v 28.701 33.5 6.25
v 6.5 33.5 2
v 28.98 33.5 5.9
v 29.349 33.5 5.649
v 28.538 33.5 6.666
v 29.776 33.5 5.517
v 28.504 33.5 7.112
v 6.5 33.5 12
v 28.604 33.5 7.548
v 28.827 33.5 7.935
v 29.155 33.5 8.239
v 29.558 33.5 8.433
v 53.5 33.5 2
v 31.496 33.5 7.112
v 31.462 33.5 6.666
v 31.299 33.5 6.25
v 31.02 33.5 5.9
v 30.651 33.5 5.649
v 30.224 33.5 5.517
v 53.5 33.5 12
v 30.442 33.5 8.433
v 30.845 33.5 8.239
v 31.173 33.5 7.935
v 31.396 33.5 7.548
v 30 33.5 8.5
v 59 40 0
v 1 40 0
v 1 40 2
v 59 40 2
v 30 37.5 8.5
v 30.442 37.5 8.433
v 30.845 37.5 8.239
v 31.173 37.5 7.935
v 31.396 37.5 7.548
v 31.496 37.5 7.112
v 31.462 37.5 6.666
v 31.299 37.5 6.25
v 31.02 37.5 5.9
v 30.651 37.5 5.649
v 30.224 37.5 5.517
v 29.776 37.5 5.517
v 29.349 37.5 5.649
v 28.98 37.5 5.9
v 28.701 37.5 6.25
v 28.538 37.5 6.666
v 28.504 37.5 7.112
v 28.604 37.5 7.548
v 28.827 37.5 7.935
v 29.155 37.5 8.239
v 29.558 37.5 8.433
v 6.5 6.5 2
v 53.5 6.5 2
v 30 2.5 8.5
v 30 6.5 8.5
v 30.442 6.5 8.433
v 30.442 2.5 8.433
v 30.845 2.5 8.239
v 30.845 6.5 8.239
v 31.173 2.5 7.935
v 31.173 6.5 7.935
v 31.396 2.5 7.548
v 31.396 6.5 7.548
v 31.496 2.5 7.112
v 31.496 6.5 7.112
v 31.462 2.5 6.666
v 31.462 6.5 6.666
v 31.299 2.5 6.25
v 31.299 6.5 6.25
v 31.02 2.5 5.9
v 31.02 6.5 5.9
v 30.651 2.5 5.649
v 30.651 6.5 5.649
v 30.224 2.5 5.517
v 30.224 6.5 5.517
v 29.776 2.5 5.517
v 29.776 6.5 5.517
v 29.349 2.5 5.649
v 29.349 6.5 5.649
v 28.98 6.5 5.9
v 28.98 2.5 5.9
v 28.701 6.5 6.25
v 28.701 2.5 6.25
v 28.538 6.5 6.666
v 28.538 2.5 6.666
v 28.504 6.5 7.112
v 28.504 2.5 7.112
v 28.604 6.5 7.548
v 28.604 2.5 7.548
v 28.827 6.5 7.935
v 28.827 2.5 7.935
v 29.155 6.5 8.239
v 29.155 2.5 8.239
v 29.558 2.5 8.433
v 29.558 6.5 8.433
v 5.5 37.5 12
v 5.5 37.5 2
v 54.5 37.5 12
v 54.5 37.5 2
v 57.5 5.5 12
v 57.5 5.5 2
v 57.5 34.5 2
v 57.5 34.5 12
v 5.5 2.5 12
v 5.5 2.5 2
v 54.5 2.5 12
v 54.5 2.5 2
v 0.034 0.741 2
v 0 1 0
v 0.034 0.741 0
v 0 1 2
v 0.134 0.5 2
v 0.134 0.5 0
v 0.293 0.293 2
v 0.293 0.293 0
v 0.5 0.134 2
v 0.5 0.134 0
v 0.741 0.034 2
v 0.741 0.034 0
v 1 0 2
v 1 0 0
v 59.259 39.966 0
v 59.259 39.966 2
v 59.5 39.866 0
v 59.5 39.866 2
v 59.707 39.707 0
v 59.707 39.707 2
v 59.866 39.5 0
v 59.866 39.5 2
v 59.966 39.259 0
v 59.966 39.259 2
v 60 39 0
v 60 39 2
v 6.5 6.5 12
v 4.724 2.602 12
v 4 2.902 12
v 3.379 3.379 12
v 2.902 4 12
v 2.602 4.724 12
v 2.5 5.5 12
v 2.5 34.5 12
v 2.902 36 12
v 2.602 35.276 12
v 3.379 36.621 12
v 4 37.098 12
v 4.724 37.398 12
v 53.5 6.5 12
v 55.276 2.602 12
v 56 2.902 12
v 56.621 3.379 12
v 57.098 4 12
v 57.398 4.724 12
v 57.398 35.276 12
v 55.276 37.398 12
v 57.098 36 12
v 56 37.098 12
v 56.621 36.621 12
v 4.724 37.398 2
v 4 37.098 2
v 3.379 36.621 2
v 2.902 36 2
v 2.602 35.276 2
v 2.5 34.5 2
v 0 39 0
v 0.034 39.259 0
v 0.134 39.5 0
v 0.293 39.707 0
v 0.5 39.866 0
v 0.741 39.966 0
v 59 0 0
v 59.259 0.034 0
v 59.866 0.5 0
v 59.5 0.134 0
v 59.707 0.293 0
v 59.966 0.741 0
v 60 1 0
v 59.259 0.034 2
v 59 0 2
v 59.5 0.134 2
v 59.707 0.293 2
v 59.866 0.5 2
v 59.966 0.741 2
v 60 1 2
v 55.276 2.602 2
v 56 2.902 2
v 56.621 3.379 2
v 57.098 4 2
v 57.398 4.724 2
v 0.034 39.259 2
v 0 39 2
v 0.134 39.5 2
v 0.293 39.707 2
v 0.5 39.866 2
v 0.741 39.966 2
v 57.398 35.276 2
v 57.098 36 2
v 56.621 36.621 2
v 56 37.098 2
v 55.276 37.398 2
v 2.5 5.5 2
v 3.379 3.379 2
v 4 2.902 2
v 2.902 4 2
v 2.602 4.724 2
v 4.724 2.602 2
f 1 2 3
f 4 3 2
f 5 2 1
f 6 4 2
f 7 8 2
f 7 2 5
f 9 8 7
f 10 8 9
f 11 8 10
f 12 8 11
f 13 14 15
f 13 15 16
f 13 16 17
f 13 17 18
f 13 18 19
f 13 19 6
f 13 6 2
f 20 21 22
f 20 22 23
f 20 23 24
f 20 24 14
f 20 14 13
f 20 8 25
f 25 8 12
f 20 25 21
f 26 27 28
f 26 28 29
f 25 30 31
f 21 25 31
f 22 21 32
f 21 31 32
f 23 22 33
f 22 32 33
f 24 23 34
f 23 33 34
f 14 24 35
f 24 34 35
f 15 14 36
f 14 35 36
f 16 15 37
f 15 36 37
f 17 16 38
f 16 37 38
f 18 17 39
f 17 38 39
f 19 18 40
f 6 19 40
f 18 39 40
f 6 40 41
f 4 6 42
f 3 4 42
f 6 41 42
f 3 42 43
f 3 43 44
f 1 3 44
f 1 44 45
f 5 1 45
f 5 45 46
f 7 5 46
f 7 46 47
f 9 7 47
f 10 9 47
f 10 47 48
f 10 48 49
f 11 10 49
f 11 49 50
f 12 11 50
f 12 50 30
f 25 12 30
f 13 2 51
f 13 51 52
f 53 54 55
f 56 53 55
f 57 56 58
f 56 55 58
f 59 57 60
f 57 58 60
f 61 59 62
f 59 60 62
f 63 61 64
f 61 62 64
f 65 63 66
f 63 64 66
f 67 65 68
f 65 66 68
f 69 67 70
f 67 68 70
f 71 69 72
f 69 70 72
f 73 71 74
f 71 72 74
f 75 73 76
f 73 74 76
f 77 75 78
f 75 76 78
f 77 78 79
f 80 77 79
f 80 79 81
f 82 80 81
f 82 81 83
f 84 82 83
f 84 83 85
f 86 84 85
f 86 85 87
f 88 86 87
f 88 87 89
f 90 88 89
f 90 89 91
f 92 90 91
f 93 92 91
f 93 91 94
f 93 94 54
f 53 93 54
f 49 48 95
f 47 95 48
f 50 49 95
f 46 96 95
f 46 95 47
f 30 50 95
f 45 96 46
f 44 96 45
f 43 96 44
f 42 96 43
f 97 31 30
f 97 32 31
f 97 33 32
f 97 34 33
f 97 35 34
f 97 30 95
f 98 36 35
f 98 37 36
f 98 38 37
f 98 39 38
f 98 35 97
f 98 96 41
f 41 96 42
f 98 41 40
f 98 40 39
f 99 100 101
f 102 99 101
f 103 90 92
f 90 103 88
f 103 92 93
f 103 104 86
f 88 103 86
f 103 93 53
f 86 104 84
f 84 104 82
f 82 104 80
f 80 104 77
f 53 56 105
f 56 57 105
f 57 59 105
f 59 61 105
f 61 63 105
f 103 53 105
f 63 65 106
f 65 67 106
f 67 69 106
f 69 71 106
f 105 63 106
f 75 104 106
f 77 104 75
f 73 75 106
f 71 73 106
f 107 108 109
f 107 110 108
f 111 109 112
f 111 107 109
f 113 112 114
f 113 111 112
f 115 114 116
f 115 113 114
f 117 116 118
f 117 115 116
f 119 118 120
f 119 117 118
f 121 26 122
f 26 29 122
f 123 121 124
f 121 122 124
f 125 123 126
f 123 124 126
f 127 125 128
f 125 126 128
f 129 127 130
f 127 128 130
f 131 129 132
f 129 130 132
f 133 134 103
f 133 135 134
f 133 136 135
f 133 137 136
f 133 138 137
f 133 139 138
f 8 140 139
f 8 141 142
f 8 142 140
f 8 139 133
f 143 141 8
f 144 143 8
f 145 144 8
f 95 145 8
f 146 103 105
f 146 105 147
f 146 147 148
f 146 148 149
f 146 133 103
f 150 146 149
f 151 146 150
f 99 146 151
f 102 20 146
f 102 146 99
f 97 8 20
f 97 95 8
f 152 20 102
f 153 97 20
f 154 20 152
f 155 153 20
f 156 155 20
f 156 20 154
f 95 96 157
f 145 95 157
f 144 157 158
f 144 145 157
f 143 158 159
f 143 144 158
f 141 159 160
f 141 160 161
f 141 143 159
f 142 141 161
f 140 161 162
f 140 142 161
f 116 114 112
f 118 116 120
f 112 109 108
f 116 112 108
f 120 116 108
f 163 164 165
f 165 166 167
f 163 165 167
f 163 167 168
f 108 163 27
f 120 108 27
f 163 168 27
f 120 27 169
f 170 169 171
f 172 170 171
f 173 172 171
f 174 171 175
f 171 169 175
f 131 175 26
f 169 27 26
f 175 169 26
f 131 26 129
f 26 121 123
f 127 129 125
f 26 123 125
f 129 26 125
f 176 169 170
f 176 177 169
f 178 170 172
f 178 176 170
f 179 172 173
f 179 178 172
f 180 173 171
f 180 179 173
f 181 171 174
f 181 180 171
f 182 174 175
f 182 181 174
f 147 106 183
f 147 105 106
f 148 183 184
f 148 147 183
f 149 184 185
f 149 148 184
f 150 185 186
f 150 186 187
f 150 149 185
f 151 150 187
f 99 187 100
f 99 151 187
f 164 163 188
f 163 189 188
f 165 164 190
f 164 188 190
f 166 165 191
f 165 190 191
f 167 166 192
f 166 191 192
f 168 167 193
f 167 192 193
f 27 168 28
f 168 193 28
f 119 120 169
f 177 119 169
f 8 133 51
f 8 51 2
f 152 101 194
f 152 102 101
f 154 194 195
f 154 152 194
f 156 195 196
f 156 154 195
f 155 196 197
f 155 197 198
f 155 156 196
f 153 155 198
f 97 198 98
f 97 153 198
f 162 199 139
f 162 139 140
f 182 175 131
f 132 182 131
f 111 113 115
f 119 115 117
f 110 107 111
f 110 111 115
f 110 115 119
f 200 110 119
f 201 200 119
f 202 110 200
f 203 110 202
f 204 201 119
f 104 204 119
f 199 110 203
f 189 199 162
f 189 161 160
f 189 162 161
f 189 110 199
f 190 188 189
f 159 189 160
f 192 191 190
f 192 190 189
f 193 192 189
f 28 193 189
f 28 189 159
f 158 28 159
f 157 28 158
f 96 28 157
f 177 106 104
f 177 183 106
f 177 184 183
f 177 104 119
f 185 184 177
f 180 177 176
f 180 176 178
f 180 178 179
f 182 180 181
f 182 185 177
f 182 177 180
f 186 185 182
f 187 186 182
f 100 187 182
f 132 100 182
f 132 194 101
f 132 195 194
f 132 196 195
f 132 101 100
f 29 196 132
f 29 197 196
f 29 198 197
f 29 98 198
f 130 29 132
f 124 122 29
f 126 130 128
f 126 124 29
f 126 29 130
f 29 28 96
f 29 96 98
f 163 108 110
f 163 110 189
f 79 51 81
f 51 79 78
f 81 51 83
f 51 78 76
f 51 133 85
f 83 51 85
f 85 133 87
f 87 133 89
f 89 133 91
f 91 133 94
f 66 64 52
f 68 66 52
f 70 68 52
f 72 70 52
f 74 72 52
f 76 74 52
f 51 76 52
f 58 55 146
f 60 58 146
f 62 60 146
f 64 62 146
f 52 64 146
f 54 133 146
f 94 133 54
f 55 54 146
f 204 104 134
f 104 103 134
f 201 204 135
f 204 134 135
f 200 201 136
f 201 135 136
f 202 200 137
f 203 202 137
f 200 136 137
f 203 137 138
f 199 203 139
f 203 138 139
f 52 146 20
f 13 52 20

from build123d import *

# Parameters (mm, degrees)
ESQUISSE1_W             = 60
ESQUISSE1_H             = 40
BOSS_EXTRU_1_DEPTH      = 2
ESQUISSE2_W             = 55
ESQUISSE2_H             = 35
BOSS_EXTRU_2_DEPTH      = 10
CONG_1_R                = 3
CONG_2_R                = 1
ESQUISSE3_W             = 47
ESQUISSE3_H             = 27
ENL_V_MAT_EXTRU_1_DEPTH = 10
ESQUISSE4_R             = 1.5
ENL_V_MAT_EXTRU_2_DEPTH = 72.765242283


with BuildPart() as part:
    # Esquisse1 → Boss.-Extru.1 (new body)
    with BuildSketch(Plane.XY):
        with Locations((30, 20)):
            Rectangle(ESQUISSE1_W, ESQUISSE1_H)
    extrude(amount=BOSS_EXTRU_1_DEPTH)

    # Esquisse2 → Boss.-Extru.2 (add)
    with BuildSketch(Plane.XY.offset(2)):
        with Locations((30, 20)):
            Rectangle(ESQUISSE2_W, ESQUISSE2_H)
    extrude(amount=BOSS_EXTRU_2_DEPTH)

    # Congé1
    cong_1_edges = [part.edges().sort_by_distance(p)[0] for p in [
        (57.5, 37.5, 7),
        (2.5, 37.5, 7),
        (2.5, 2.5, 7),
        (57.5, 2.5, 7),
    ]]
    fillet(cong_1_edges, radius=CONG_1_R)

    # Congé2
    cong_2_edges = [part.edges().sort_by_distance(p)[0] for p in [
        (0, 40, 1),
        (60, 40, 1),
        (60, 0, 1),
        (0, 0, 1),
    ]]
    fillet(cong_2_edges, radius=CONG_2_R)

    # Esquisse3 → Enlèv. mat.-Extru.1 (cut)
    with BuildSketch(Plane.XY.offset(12)):
        with Locations((30, 20)):
            Rectangle(ESQUISSE3_W, ESQUISSE3_H)
    extrude(amount=-ENL_V_MAT_EXTRU_1_DEPTH, mode=Mode.SUBTRACT)

    # Esquisse4 → Enlèv. mat.-Extru.2 (cut, through all)
    with BuildSketch(Plane(origin=(0, 37.5, 0), x_dir=(1, 0, 0), z_dir=(0, 1, 0))):
        with Locations(Location((30, -7, 0), (0, 0, 270))):
            Circle(ESQUISSE4_R)
    extrude(amount=-ENL_V_MAT_EXTRU_2_DEPTH, mode=Mode.SUBTRACT)


solid = part.part
